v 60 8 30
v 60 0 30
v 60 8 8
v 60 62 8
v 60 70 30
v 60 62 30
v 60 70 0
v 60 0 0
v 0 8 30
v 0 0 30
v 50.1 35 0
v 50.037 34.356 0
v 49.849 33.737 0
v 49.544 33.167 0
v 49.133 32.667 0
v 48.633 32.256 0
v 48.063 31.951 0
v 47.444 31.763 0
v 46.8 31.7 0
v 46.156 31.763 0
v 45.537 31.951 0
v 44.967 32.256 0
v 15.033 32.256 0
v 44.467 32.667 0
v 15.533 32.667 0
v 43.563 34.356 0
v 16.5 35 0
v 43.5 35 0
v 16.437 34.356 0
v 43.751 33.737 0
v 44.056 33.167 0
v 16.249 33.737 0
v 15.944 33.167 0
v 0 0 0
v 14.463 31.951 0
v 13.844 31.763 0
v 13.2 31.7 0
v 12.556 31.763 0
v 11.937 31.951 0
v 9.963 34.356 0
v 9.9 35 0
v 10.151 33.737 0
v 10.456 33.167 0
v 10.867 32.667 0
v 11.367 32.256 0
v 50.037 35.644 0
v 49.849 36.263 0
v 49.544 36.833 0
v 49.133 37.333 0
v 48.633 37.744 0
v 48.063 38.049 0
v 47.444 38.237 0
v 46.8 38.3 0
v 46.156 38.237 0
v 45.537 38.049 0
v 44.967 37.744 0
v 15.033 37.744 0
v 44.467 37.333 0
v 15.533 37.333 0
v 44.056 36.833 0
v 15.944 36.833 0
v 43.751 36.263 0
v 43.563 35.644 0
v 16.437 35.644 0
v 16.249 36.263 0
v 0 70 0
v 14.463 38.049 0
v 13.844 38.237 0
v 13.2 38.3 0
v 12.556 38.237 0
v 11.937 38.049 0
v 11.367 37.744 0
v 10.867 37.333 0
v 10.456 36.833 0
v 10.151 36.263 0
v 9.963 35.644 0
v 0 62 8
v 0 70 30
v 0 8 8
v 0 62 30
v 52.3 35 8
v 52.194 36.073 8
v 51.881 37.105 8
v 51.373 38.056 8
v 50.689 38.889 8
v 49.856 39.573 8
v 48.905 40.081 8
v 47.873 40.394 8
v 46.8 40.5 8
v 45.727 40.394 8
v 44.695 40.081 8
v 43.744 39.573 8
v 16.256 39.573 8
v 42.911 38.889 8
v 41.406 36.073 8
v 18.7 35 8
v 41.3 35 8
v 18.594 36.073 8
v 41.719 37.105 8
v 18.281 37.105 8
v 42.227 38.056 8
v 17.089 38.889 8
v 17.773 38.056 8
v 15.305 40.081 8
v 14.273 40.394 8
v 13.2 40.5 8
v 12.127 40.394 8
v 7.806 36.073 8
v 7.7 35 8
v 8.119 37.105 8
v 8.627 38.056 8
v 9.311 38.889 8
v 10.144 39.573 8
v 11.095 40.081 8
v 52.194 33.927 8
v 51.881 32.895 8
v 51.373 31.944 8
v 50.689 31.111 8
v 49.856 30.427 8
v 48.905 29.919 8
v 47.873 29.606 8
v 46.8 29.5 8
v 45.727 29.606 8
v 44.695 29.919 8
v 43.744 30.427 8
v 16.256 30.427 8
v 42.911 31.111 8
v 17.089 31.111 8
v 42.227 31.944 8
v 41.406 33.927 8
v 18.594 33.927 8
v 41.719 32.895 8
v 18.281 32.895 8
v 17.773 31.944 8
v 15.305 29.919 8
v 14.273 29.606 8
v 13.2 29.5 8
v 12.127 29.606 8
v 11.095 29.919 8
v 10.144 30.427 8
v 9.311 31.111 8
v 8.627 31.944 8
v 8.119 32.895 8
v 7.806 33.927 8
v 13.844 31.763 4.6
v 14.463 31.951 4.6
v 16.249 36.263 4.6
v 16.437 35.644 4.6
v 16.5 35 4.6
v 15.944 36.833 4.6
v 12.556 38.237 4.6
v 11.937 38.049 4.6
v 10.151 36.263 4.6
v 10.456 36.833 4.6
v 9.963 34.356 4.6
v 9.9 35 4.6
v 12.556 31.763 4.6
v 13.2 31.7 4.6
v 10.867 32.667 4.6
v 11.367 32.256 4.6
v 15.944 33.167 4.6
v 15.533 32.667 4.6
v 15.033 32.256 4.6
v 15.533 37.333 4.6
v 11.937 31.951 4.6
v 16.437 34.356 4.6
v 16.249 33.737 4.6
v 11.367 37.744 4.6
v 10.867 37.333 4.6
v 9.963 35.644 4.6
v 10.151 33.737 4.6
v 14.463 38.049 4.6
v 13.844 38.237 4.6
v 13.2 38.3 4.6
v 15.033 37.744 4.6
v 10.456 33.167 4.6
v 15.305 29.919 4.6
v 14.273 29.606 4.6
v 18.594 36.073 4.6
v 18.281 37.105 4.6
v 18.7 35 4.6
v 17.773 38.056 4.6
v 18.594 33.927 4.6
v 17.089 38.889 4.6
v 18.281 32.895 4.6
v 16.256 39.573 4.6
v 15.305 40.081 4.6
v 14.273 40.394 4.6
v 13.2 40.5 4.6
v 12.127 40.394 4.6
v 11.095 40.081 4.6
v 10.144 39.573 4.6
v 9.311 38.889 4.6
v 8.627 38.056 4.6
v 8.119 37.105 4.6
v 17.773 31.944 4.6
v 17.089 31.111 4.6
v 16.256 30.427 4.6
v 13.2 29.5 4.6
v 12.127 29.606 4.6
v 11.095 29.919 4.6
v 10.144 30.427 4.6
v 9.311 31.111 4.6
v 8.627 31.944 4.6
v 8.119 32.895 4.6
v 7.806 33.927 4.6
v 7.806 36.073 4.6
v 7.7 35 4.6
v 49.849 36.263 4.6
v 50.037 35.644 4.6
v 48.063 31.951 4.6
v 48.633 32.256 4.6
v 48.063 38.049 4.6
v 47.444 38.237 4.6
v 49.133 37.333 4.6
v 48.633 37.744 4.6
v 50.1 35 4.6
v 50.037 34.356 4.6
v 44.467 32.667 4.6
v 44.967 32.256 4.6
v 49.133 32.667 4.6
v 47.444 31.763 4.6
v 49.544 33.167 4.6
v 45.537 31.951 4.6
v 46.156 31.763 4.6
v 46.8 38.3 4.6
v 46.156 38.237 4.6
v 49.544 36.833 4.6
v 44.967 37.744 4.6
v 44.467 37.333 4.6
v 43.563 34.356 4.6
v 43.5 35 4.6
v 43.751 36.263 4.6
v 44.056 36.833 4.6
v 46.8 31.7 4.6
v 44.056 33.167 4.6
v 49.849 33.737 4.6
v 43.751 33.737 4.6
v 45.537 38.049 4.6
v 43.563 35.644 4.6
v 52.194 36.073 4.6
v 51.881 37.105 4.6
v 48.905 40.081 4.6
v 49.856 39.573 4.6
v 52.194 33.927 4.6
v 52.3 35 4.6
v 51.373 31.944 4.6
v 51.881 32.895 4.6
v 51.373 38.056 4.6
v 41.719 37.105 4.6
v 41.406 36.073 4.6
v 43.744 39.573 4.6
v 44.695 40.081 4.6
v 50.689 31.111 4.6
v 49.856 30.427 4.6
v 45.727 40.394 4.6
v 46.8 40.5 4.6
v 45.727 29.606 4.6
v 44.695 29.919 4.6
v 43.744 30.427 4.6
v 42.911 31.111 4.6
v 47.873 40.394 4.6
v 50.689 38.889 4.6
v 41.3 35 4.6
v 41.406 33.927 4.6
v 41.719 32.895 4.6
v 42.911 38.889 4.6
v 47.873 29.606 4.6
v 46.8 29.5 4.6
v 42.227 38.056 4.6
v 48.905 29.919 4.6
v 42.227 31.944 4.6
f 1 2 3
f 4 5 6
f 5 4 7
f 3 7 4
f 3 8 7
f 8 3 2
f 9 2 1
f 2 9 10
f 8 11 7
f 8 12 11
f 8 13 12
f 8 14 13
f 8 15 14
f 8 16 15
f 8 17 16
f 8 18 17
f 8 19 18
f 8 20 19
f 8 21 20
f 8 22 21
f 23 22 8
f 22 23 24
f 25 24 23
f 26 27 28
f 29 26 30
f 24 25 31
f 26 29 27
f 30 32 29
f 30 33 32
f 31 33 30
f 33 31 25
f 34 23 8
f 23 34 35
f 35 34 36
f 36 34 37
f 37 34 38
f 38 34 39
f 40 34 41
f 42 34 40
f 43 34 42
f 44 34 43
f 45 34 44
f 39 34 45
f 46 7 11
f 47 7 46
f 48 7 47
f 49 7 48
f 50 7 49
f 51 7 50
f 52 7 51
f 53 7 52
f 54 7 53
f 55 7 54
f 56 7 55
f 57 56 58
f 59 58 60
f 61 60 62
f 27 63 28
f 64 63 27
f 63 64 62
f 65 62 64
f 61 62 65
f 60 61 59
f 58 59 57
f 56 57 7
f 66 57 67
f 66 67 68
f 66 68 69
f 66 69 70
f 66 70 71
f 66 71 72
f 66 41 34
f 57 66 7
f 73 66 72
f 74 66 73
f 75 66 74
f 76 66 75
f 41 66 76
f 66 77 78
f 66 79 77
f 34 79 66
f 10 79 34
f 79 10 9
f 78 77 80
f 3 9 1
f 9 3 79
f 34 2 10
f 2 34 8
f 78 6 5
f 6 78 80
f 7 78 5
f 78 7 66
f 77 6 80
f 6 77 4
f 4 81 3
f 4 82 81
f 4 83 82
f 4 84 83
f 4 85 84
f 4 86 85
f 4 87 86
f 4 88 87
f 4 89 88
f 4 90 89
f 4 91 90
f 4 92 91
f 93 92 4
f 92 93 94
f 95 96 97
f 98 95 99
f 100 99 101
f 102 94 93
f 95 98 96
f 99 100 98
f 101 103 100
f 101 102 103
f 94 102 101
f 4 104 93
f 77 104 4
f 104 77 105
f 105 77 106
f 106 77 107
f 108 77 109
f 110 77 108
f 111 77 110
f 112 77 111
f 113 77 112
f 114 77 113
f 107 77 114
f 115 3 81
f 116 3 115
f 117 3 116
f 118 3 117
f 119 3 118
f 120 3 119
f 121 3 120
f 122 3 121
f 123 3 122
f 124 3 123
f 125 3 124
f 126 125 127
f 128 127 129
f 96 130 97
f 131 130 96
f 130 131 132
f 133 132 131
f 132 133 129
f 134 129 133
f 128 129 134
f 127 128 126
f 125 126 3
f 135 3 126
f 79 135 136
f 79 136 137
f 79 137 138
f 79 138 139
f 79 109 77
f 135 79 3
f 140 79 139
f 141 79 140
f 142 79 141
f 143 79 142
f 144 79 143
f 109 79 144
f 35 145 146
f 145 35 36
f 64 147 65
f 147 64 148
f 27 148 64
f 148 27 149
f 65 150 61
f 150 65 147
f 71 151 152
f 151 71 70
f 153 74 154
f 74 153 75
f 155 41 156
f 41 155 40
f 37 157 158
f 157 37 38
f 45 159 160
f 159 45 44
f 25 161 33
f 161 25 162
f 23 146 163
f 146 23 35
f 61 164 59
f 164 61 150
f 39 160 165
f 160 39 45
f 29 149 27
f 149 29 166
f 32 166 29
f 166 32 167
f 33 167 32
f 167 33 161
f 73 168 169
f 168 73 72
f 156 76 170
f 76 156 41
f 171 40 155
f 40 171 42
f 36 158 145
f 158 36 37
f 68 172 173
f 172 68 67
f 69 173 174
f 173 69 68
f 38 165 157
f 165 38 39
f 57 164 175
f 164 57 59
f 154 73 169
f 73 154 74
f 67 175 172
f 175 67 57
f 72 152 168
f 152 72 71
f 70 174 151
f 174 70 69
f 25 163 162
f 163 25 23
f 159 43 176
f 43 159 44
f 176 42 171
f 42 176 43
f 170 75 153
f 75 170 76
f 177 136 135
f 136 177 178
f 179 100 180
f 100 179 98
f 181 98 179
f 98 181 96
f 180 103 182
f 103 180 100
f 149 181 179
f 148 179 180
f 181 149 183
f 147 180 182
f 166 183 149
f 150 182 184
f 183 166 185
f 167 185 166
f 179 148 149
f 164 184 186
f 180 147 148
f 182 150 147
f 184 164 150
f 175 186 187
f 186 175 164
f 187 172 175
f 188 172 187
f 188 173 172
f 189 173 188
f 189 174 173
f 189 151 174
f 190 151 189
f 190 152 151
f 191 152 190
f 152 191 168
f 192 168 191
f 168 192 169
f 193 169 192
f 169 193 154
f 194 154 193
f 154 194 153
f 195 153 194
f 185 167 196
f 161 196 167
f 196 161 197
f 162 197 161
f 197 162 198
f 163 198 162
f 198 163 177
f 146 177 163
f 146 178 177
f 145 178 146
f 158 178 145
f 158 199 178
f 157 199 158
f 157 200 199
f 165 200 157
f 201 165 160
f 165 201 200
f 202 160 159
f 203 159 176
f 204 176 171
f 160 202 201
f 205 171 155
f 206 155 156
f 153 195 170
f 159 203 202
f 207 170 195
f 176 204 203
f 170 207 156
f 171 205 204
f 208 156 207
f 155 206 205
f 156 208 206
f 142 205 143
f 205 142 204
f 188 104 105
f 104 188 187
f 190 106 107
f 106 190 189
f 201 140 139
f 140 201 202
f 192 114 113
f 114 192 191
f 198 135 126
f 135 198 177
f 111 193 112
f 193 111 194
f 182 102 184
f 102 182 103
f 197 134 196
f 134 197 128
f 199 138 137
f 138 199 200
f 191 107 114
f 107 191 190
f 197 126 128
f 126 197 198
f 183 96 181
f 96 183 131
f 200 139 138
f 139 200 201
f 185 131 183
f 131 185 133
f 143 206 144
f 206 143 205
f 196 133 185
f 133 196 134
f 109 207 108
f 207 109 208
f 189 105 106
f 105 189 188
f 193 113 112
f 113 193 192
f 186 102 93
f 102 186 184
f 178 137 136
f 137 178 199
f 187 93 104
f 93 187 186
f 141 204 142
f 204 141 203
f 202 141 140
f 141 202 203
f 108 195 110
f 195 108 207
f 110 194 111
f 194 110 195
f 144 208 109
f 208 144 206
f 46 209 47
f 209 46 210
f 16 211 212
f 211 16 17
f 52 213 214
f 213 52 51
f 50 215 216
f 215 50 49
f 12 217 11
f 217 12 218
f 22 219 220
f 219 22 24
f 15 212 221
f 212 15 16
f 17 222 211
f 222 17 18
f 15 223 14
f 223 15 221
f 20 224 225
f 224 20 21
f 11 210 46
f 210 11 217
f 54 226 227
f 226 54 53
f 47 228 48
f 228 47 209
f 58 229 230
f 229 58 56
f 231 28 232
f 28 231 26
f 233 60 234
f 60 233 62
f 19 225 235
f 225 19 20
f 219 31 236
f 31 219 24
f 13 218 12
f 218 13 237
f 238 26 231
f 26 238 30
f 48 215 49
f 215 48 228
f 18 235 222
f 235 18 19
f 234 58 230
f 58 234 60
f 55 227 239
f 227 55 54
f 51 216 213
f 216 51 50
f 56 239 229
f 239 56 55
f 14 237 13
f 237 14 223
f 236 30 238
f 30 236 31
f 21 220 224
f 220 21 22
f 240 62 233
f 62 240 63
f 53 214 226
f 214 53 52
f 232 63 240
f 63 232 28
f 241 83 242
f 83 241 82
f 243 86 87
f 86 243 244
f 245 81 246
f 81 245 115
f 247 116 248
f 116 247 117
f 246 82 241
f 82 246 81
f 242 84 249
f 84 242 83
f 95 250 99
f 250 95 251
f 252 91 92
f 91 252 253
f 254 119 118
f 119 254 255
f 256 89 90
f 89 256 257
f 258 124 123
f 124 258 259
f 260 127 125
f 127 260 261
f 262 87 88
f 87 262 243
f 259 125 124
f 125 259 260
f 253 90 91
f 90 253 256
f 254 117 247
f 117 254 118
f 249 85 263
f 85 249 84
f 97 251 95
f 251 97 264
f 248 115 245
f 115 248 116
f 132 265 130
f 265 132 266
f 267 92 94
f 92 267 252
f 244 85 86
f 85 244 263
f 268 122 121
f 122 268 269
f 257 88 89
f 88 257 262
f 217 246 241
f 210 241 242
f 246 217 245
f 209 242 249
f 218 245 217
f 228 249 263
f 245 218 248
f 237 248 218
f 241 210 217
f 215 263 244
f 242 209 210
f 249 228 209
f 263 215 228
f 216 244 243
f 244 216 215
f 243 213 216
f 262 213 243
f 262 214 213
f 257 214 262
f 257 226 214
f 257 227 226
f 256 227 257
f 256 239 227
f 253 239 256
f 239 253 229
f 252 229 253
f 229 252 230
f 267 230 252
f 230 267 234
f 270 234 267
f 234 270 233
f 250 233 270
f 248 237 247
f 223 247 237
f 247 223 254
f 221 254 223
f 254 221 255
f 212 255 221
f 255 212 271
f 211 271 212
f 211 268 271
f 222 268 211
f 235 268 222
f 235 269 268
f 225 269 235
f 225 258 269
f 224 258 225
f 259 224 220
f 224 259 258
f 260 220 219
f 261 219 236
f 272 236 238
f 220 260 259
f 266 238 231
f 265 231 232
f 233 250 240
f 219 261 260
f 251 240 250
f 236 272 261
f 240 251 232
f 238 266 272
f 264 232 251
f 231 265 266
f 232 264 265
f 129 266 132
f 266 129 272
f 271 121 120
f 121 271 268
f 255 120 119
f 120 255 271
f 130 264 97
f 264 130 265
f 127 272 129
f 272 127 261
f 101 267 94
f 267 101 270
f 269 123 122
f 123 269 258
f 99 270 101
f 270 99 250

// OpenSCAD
$fn = 32;

// ----------------------------------------------------------------------
// U-bracket: 60 x 70 x 30 mm
// ----------------------------------------------------------------------

// --- parameters (mm) ---
length = 60;              // outer length, X
width = 70;               // outer width, Y
height = 30;              // upright height, Z
thick = 8;                // wall thickness
hole_d = 6.6;             // clearance for M6
cb_d = 11;                // counterbore diameter
cb_h = 3.4;               // counterbore depth

module hole_z(px, py) {
  translate([px, py, -0.5]) cylinder(h = thick + 1, d = hole_d);
}
module hole_y_pz(pz) {
  /* through both uprights along Y */
  translate([0, -0.5, pz]) rotate([-90, 0, 0]) cylinder(h = width + 1, d = hole_d);
}
module cb_z(px, py) {
  translate([px, py, thick - cb_h]) cylinder(h = cb_h + 0.4, d = cb_d);
}

module base() {
  cube([length, width, thick]);
}

module uprights() {
  cube([length, thick, height]);
  translate([0, width - thick, 0]) cube([length, thick, height]);
}

difference() {
  union() {
    base();
    uprights();
  }
  hole_z(13.2, 35);
  cb_z(13.2, 35);
  hole_z(46.8, 35);
  cb_z(46.8, 35);
}
